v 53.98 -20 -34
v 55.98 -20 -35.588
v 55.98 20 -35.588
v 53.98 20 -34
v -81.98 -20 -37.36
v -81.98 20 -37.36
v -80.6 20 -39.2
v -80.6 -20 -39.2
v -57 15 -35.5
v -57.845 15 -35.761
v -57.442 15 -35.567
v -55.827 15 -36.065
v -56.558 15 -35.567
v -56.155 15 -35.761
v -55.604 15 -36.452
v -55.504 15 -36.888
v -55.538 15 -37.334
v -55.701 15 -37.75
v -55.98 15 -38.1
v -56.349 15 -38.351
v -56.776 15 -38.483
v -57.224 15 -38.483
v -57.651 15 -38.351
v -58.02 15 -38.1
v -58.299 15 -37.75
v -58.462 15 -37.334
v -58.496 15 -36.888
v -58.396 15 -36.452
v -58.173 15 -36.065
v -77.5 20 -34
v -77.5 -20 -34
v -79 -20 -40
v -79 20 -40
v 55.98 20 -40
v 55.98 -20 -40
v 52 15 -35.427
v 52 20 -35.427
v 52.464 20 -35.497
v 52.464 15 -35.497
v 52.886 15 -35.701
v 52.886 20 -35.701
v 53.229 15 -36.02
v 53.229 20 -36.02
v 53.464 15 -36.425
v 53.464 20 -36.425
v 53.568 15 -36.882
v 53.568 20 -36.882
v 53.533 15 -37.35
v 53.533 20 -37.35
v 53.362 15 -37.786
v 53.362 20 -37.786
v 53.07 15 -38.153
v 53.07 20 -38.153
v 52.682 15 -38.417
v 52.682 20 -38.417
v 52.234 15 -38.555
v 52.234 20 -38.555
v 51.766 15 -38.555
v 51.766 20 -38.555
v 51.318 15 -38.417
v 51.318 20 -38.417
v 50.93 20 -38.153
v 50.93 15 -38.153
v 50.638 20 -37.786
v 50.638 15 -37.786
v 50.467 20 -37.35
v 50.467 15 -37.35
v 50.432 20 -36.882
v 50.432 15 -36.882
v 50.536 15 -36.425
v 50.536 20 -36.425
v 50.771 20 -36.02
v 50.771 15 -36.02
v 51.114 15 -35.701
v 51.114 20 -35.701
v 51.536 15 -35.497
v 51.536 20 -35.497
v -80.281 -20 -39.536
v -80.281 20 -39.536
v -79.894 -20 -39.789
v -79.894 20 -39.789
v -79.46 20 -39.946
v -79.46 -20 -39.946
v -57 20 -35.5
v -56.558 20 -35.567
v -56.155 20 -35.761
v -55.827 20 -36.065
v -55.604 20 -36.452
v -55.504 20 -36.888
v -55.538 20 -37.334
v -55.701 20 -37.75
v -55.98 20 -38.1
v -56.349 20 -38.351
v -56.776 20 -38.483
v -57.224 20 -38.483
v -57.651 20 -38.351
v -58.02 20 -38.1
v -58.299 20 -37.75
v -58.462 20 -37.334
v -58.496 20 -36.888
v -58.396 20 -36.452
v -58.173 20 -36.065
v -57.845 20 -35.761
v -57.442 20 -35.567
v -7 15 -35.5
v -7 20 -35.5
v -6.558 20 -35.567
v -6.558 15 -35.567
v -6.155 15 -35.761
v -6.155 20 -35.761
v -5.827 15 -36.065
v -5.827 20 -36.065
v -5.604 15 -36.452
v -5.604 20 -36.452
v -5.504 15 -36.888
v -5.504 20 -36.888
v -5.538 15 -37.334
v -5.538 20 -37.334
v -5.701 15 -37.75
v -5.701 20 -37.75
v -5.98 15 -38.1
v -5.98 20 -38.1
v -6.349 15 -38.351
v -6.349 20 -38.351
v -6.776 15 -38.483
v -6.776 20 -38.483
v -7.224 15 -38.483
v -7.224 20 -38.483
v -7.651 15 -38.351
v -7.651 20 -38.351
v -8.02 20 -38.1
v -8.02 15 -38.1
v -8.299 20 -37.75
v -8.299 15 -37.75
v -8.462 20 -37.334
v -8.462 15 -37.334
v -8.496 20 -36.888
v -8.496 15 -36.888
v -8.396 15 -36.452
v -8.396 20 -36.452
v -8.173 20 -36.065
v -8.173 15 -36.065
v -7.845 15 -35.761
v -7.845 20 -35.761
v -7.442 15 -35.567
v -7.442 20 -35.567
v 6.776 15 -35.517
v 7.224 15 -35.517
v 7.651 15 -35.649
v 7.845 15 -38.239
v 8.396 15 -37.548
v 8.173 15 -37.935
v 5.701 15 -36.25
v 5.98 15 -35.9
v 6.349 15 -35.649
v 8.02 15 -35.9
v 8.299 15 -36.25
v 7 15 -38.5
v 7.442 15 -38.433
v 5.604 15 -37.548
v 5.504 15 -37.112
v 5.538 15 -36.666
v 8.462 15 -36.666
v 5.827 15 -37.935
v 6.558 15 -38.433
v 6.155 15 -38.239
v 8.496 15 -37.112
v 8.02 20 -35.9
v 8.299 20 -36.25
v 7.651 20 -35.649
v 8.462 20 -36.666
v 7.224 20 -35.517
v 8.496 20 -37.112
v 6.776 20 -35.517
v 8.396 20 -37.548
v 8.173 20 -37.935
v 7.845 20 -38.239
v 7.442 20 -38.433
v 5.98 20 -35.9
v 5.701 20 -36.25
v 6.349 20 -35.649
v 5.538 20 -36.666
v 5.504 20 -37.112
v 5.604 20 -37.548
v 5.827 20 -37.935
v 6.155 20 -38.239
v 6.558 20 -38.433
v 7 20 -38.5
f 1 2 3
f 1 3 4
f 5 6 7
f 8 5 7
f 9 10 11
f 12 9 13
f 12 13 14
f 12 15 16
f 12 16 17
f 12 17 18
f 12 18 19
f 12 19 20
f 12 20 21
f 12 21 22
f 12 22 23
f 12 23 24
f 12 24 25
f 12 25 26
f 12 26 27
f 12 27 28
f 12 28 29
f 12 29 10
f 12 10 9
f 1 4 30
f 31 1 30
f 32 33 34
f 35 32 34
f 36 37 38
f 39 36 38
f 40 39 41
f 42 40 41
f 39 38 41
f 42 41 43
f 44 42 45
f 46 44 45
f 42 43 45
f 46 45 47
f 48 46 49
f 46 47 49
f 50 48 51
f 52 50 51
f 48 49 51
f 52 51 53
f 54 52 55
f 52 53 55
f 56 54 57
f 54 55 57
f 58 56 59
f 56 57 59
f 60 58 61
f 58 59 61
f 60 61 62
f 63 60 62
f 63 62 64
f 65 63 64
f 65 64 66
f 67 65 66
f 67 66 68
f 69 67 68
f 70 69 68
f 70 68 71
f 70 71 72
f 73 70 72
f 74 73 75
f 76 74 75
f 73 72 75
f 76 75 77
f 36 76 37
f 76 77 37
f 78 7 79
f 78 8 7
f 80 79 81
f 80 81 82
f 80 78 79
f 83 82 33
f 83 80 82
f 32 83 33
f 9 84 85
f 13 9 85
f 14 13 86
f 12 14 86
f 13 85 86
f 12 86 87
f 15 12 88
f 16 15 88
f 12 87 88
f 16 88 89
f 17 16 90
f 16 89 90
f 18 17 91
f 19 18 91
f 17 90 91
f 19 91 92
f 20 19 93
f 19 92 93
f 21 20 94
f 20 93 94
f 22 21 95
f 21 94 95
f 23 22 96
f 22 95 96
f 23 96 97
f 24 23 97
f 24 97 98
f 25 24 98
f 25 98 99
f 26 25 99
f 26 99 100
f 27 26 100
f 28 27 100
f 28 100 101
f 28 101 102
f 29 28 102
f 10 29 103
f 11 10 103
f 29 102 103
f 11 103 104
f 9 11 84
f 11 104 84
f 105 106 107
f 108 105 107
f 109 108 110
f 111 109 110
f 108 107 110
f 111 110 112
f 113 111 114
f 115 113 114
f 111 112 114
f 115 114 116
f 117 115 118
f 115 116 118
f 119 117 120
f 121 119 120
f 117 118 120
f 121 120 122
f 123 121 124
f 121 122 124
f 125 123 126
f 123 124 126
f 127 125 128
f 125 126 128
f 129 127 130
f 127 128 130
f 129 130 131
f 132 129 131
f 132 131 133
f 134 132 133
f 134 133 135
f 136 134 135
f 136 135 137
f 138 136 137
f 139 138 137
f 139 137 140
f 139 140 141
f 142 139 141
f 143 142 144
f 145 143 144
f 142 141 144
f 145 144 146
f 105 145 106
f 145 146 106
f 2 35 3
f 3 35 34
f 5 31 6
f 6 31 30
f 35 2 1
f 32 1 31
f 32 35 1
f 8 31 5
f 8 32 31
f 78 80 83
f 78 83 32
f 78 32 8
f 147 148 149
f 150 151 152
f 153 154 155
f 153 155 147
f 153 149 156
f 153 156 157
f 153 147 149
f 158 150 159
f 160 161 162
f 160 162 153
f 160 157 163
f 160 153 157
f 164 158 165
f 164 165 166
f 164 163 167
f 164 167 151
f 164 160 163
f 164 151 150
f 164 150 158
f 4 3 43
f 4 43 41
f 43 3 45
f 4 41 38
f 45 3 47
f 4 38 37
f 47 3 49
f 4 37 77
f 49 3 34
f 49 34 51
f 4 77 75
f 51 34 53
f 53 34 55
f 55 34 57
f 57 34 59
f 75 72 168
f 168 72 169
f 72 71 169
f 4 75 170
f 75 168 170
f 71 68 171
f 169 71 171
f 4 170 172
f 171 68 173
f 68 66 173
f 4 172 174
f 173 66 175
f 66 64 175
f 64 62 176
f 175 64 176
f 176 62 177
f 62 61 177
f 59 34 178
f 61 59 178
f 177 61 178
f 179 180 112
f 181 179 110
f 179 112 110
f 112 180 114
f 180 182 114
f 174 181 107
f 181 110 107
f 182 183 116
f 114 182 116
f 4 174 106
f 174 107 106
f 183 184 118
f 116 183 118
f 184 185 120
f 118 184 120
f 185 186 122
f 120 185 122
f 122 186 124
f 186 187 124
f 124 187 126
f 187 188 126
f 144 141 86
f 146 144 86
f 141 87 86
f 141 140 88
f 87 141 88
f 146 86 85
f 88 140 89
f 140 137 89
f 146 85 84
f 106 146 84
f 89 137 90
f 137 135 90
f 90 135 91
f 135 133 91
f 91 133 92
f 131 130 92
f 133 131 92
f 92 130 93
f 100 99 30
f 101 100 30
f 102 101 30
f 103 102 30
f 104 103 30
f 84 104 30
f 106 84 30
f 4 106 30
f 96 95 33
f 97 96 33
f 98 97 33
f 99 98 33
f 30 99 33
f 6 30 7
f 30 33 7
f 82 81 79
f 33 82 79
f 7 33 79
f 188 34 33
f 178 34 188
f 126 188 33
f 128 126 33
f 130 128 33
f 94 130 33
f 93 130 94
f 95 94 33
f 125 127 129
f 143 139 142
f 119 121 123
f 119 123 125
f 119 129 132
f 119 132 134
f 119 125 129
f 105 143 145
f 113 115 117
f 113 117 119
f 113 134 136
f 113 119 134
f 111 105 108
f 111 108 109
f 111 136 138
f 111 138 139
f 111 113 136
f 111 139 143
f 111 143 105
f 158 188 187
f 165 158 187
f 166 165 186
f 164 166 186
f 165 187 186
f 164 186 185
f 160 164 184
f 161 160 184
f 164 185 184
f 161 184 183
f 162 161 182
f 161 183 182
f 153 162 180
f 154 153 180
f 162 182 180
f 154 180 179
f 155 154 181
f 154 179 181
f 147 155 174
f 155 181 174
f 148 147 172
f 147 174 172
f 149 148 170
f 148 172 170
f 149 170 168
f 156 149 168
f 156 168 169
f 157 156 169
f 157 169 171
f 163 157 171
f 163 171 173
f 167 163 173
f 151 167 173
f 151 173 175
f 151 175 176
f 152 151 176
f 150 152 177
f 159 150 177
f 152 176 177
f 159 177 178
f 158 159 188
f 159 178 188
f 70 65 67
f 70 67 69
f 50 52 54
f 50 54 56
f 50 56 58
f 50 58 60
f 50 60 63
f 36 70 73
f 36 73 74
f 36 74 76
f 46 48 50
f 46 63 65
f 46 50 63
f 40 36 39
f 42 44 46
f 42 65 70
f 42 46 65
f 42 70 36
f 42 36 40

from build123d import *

# Parameters (mm, degrees)
BOSS_EXTRUDE1_DEPTH     = 20
SKETCH2_R               = 1.5
SKETCH2_R_2             = 1.572515875
CUT_EXTRUDE1_DEPTH      = 5
FILLET1_R               = 2
SKETCH3_W               = 103.784472799
SKETCH3_H               = 73.748761466
CUT_EXTRUDE2_DEPTH      = 184.826439883
CUT_EXTRUDE3_DEPTH      = 85.597401851
CUT_EXTRUDE3_DEPTH_BACK = 85.597401851
SKETCH4_W               = 26
SKETCH4_H               = 40
CUT_EXTRUDE4_DEPTH      = 100.602813213
CUT_EXTRUDE4_DEPTH_BACK = 100.602813213


with BuildPart() as part:
    # Sketch1 → Boss-Extrude1 (new, symmetric)
    with BuildSketch(Plane(origin=(0, 0, 0), x_dir=(1, 0, 0), z_dir=(0, 1, 0))):
        Polygon((-110, 0), (-80, 40), (80, 40), (110, 0), (103, 0), (77.5, 34), (-77.5, 34), (-103, 0), align=None)
    extrude(amount=BOSS_EXTRUDE1_DEPTH, both=True)

    # Sketch2 → Cut-Extrude1 (cut)
    with BuildSketch(Plane(origin=(0, 20, 0), x_dir=(1, 0, 0), z_dir=(0, 1, 0))):
        with Locations(Location((-104, 3, 0), (0, 0, 270))):
            Circle(SKETCH2_R)
        with Locations(Location((-57, 37, 0), (0, 0, 270))):
            Circle(SKETCH2_R)
        with Locations(Location((-7, 37, 0), (0, 0, 270))):
            Circle(SKETCH2_R)
        with Locations(Location((7, 37, 0), (0, 0, 90))):
            Circle(SKETCH2_R)
        with Locations(Location((104, 3, 0), (0, 0, 90))):
            Circle(SKETCH2_R)
        with Locations(Location((52, 37, 0), (0, 0, 270))):
            Circle(SKETCH2_R_2)
    extrude(amount=-CUT_EXTRUDE1_DEPTH, mode=Mode.SUBTRACT)

    # Fillet1
    fillet1_edges = [part.edges().sort_by_distance(p)[0] for p in [
        (-80, 0, -40),
        (80, 0, -40),
    ]]
    fillet(fillet1_edges, radius=FILLET1_R)

    # Sketch3 → Cut-Extrude2 (cut, symmetric)
    with BuildSketch(Plane(origin=(-65.92, 0, -49.44), x_dir=(0.5999999999999999, 0, -0.8000000000000002), z_dir=(0.8000000000000003, 0, 0.5999999999999999))):
        with Locations((-71.1922364, 16.874380733)):
            Rectangle(SKETCH3_W, SKETCH3_H)
    cut_extrude2 = extrude(amount=CUT_EXTRUDE2_DEPTH, both=True, mode=Mode.SUBTRACT)

    # Mirror1: Cut-Extrude2 across plane
    add(cut_extrude2.mirror(Plane(origin=(0, 0, 0), x_dir=(0, 0, 1), z_dir=(1, 0, 0))), mode=Mode.SUBTRACT)

    # Sketch4 → Cut-Extrude3 (cut, two sides: drawn at the far end of the back side and taken through both)
    with BuildSketch(Plane.XY.offset(-34).offset(-CUT_EXTRUDE3_DEPTH_BACK)):
        with Locations((68.98, 0)):
            Rectangle(SKETCH4_W, SKETCH4_H)
    extrude(amount=CUT_EXTRUDE3_DEPTH + CUT_EXTRUDE3_DEPTH_BACK, mode=Mode.SUBTRACT)

    # Sketch5 → Cut-Extrude4 (cut, two sides: drawn at the far end of the back side and taken through both)
    with BuildSketch(Plane.XZ.offset(20).offset(-CUT_EXTRUDE4_DEPTH_BACK)):
        Polygon((55.98, -35.588024178), (53.98, -34), (55.98, -34), align=None)
    extrude(amount=CUT_EXTRUDE4_DEPTH + CUT_EXTRUDE4_DEPTH_BACK, mode=Mode.SUBTRACT)


solid = part.part
